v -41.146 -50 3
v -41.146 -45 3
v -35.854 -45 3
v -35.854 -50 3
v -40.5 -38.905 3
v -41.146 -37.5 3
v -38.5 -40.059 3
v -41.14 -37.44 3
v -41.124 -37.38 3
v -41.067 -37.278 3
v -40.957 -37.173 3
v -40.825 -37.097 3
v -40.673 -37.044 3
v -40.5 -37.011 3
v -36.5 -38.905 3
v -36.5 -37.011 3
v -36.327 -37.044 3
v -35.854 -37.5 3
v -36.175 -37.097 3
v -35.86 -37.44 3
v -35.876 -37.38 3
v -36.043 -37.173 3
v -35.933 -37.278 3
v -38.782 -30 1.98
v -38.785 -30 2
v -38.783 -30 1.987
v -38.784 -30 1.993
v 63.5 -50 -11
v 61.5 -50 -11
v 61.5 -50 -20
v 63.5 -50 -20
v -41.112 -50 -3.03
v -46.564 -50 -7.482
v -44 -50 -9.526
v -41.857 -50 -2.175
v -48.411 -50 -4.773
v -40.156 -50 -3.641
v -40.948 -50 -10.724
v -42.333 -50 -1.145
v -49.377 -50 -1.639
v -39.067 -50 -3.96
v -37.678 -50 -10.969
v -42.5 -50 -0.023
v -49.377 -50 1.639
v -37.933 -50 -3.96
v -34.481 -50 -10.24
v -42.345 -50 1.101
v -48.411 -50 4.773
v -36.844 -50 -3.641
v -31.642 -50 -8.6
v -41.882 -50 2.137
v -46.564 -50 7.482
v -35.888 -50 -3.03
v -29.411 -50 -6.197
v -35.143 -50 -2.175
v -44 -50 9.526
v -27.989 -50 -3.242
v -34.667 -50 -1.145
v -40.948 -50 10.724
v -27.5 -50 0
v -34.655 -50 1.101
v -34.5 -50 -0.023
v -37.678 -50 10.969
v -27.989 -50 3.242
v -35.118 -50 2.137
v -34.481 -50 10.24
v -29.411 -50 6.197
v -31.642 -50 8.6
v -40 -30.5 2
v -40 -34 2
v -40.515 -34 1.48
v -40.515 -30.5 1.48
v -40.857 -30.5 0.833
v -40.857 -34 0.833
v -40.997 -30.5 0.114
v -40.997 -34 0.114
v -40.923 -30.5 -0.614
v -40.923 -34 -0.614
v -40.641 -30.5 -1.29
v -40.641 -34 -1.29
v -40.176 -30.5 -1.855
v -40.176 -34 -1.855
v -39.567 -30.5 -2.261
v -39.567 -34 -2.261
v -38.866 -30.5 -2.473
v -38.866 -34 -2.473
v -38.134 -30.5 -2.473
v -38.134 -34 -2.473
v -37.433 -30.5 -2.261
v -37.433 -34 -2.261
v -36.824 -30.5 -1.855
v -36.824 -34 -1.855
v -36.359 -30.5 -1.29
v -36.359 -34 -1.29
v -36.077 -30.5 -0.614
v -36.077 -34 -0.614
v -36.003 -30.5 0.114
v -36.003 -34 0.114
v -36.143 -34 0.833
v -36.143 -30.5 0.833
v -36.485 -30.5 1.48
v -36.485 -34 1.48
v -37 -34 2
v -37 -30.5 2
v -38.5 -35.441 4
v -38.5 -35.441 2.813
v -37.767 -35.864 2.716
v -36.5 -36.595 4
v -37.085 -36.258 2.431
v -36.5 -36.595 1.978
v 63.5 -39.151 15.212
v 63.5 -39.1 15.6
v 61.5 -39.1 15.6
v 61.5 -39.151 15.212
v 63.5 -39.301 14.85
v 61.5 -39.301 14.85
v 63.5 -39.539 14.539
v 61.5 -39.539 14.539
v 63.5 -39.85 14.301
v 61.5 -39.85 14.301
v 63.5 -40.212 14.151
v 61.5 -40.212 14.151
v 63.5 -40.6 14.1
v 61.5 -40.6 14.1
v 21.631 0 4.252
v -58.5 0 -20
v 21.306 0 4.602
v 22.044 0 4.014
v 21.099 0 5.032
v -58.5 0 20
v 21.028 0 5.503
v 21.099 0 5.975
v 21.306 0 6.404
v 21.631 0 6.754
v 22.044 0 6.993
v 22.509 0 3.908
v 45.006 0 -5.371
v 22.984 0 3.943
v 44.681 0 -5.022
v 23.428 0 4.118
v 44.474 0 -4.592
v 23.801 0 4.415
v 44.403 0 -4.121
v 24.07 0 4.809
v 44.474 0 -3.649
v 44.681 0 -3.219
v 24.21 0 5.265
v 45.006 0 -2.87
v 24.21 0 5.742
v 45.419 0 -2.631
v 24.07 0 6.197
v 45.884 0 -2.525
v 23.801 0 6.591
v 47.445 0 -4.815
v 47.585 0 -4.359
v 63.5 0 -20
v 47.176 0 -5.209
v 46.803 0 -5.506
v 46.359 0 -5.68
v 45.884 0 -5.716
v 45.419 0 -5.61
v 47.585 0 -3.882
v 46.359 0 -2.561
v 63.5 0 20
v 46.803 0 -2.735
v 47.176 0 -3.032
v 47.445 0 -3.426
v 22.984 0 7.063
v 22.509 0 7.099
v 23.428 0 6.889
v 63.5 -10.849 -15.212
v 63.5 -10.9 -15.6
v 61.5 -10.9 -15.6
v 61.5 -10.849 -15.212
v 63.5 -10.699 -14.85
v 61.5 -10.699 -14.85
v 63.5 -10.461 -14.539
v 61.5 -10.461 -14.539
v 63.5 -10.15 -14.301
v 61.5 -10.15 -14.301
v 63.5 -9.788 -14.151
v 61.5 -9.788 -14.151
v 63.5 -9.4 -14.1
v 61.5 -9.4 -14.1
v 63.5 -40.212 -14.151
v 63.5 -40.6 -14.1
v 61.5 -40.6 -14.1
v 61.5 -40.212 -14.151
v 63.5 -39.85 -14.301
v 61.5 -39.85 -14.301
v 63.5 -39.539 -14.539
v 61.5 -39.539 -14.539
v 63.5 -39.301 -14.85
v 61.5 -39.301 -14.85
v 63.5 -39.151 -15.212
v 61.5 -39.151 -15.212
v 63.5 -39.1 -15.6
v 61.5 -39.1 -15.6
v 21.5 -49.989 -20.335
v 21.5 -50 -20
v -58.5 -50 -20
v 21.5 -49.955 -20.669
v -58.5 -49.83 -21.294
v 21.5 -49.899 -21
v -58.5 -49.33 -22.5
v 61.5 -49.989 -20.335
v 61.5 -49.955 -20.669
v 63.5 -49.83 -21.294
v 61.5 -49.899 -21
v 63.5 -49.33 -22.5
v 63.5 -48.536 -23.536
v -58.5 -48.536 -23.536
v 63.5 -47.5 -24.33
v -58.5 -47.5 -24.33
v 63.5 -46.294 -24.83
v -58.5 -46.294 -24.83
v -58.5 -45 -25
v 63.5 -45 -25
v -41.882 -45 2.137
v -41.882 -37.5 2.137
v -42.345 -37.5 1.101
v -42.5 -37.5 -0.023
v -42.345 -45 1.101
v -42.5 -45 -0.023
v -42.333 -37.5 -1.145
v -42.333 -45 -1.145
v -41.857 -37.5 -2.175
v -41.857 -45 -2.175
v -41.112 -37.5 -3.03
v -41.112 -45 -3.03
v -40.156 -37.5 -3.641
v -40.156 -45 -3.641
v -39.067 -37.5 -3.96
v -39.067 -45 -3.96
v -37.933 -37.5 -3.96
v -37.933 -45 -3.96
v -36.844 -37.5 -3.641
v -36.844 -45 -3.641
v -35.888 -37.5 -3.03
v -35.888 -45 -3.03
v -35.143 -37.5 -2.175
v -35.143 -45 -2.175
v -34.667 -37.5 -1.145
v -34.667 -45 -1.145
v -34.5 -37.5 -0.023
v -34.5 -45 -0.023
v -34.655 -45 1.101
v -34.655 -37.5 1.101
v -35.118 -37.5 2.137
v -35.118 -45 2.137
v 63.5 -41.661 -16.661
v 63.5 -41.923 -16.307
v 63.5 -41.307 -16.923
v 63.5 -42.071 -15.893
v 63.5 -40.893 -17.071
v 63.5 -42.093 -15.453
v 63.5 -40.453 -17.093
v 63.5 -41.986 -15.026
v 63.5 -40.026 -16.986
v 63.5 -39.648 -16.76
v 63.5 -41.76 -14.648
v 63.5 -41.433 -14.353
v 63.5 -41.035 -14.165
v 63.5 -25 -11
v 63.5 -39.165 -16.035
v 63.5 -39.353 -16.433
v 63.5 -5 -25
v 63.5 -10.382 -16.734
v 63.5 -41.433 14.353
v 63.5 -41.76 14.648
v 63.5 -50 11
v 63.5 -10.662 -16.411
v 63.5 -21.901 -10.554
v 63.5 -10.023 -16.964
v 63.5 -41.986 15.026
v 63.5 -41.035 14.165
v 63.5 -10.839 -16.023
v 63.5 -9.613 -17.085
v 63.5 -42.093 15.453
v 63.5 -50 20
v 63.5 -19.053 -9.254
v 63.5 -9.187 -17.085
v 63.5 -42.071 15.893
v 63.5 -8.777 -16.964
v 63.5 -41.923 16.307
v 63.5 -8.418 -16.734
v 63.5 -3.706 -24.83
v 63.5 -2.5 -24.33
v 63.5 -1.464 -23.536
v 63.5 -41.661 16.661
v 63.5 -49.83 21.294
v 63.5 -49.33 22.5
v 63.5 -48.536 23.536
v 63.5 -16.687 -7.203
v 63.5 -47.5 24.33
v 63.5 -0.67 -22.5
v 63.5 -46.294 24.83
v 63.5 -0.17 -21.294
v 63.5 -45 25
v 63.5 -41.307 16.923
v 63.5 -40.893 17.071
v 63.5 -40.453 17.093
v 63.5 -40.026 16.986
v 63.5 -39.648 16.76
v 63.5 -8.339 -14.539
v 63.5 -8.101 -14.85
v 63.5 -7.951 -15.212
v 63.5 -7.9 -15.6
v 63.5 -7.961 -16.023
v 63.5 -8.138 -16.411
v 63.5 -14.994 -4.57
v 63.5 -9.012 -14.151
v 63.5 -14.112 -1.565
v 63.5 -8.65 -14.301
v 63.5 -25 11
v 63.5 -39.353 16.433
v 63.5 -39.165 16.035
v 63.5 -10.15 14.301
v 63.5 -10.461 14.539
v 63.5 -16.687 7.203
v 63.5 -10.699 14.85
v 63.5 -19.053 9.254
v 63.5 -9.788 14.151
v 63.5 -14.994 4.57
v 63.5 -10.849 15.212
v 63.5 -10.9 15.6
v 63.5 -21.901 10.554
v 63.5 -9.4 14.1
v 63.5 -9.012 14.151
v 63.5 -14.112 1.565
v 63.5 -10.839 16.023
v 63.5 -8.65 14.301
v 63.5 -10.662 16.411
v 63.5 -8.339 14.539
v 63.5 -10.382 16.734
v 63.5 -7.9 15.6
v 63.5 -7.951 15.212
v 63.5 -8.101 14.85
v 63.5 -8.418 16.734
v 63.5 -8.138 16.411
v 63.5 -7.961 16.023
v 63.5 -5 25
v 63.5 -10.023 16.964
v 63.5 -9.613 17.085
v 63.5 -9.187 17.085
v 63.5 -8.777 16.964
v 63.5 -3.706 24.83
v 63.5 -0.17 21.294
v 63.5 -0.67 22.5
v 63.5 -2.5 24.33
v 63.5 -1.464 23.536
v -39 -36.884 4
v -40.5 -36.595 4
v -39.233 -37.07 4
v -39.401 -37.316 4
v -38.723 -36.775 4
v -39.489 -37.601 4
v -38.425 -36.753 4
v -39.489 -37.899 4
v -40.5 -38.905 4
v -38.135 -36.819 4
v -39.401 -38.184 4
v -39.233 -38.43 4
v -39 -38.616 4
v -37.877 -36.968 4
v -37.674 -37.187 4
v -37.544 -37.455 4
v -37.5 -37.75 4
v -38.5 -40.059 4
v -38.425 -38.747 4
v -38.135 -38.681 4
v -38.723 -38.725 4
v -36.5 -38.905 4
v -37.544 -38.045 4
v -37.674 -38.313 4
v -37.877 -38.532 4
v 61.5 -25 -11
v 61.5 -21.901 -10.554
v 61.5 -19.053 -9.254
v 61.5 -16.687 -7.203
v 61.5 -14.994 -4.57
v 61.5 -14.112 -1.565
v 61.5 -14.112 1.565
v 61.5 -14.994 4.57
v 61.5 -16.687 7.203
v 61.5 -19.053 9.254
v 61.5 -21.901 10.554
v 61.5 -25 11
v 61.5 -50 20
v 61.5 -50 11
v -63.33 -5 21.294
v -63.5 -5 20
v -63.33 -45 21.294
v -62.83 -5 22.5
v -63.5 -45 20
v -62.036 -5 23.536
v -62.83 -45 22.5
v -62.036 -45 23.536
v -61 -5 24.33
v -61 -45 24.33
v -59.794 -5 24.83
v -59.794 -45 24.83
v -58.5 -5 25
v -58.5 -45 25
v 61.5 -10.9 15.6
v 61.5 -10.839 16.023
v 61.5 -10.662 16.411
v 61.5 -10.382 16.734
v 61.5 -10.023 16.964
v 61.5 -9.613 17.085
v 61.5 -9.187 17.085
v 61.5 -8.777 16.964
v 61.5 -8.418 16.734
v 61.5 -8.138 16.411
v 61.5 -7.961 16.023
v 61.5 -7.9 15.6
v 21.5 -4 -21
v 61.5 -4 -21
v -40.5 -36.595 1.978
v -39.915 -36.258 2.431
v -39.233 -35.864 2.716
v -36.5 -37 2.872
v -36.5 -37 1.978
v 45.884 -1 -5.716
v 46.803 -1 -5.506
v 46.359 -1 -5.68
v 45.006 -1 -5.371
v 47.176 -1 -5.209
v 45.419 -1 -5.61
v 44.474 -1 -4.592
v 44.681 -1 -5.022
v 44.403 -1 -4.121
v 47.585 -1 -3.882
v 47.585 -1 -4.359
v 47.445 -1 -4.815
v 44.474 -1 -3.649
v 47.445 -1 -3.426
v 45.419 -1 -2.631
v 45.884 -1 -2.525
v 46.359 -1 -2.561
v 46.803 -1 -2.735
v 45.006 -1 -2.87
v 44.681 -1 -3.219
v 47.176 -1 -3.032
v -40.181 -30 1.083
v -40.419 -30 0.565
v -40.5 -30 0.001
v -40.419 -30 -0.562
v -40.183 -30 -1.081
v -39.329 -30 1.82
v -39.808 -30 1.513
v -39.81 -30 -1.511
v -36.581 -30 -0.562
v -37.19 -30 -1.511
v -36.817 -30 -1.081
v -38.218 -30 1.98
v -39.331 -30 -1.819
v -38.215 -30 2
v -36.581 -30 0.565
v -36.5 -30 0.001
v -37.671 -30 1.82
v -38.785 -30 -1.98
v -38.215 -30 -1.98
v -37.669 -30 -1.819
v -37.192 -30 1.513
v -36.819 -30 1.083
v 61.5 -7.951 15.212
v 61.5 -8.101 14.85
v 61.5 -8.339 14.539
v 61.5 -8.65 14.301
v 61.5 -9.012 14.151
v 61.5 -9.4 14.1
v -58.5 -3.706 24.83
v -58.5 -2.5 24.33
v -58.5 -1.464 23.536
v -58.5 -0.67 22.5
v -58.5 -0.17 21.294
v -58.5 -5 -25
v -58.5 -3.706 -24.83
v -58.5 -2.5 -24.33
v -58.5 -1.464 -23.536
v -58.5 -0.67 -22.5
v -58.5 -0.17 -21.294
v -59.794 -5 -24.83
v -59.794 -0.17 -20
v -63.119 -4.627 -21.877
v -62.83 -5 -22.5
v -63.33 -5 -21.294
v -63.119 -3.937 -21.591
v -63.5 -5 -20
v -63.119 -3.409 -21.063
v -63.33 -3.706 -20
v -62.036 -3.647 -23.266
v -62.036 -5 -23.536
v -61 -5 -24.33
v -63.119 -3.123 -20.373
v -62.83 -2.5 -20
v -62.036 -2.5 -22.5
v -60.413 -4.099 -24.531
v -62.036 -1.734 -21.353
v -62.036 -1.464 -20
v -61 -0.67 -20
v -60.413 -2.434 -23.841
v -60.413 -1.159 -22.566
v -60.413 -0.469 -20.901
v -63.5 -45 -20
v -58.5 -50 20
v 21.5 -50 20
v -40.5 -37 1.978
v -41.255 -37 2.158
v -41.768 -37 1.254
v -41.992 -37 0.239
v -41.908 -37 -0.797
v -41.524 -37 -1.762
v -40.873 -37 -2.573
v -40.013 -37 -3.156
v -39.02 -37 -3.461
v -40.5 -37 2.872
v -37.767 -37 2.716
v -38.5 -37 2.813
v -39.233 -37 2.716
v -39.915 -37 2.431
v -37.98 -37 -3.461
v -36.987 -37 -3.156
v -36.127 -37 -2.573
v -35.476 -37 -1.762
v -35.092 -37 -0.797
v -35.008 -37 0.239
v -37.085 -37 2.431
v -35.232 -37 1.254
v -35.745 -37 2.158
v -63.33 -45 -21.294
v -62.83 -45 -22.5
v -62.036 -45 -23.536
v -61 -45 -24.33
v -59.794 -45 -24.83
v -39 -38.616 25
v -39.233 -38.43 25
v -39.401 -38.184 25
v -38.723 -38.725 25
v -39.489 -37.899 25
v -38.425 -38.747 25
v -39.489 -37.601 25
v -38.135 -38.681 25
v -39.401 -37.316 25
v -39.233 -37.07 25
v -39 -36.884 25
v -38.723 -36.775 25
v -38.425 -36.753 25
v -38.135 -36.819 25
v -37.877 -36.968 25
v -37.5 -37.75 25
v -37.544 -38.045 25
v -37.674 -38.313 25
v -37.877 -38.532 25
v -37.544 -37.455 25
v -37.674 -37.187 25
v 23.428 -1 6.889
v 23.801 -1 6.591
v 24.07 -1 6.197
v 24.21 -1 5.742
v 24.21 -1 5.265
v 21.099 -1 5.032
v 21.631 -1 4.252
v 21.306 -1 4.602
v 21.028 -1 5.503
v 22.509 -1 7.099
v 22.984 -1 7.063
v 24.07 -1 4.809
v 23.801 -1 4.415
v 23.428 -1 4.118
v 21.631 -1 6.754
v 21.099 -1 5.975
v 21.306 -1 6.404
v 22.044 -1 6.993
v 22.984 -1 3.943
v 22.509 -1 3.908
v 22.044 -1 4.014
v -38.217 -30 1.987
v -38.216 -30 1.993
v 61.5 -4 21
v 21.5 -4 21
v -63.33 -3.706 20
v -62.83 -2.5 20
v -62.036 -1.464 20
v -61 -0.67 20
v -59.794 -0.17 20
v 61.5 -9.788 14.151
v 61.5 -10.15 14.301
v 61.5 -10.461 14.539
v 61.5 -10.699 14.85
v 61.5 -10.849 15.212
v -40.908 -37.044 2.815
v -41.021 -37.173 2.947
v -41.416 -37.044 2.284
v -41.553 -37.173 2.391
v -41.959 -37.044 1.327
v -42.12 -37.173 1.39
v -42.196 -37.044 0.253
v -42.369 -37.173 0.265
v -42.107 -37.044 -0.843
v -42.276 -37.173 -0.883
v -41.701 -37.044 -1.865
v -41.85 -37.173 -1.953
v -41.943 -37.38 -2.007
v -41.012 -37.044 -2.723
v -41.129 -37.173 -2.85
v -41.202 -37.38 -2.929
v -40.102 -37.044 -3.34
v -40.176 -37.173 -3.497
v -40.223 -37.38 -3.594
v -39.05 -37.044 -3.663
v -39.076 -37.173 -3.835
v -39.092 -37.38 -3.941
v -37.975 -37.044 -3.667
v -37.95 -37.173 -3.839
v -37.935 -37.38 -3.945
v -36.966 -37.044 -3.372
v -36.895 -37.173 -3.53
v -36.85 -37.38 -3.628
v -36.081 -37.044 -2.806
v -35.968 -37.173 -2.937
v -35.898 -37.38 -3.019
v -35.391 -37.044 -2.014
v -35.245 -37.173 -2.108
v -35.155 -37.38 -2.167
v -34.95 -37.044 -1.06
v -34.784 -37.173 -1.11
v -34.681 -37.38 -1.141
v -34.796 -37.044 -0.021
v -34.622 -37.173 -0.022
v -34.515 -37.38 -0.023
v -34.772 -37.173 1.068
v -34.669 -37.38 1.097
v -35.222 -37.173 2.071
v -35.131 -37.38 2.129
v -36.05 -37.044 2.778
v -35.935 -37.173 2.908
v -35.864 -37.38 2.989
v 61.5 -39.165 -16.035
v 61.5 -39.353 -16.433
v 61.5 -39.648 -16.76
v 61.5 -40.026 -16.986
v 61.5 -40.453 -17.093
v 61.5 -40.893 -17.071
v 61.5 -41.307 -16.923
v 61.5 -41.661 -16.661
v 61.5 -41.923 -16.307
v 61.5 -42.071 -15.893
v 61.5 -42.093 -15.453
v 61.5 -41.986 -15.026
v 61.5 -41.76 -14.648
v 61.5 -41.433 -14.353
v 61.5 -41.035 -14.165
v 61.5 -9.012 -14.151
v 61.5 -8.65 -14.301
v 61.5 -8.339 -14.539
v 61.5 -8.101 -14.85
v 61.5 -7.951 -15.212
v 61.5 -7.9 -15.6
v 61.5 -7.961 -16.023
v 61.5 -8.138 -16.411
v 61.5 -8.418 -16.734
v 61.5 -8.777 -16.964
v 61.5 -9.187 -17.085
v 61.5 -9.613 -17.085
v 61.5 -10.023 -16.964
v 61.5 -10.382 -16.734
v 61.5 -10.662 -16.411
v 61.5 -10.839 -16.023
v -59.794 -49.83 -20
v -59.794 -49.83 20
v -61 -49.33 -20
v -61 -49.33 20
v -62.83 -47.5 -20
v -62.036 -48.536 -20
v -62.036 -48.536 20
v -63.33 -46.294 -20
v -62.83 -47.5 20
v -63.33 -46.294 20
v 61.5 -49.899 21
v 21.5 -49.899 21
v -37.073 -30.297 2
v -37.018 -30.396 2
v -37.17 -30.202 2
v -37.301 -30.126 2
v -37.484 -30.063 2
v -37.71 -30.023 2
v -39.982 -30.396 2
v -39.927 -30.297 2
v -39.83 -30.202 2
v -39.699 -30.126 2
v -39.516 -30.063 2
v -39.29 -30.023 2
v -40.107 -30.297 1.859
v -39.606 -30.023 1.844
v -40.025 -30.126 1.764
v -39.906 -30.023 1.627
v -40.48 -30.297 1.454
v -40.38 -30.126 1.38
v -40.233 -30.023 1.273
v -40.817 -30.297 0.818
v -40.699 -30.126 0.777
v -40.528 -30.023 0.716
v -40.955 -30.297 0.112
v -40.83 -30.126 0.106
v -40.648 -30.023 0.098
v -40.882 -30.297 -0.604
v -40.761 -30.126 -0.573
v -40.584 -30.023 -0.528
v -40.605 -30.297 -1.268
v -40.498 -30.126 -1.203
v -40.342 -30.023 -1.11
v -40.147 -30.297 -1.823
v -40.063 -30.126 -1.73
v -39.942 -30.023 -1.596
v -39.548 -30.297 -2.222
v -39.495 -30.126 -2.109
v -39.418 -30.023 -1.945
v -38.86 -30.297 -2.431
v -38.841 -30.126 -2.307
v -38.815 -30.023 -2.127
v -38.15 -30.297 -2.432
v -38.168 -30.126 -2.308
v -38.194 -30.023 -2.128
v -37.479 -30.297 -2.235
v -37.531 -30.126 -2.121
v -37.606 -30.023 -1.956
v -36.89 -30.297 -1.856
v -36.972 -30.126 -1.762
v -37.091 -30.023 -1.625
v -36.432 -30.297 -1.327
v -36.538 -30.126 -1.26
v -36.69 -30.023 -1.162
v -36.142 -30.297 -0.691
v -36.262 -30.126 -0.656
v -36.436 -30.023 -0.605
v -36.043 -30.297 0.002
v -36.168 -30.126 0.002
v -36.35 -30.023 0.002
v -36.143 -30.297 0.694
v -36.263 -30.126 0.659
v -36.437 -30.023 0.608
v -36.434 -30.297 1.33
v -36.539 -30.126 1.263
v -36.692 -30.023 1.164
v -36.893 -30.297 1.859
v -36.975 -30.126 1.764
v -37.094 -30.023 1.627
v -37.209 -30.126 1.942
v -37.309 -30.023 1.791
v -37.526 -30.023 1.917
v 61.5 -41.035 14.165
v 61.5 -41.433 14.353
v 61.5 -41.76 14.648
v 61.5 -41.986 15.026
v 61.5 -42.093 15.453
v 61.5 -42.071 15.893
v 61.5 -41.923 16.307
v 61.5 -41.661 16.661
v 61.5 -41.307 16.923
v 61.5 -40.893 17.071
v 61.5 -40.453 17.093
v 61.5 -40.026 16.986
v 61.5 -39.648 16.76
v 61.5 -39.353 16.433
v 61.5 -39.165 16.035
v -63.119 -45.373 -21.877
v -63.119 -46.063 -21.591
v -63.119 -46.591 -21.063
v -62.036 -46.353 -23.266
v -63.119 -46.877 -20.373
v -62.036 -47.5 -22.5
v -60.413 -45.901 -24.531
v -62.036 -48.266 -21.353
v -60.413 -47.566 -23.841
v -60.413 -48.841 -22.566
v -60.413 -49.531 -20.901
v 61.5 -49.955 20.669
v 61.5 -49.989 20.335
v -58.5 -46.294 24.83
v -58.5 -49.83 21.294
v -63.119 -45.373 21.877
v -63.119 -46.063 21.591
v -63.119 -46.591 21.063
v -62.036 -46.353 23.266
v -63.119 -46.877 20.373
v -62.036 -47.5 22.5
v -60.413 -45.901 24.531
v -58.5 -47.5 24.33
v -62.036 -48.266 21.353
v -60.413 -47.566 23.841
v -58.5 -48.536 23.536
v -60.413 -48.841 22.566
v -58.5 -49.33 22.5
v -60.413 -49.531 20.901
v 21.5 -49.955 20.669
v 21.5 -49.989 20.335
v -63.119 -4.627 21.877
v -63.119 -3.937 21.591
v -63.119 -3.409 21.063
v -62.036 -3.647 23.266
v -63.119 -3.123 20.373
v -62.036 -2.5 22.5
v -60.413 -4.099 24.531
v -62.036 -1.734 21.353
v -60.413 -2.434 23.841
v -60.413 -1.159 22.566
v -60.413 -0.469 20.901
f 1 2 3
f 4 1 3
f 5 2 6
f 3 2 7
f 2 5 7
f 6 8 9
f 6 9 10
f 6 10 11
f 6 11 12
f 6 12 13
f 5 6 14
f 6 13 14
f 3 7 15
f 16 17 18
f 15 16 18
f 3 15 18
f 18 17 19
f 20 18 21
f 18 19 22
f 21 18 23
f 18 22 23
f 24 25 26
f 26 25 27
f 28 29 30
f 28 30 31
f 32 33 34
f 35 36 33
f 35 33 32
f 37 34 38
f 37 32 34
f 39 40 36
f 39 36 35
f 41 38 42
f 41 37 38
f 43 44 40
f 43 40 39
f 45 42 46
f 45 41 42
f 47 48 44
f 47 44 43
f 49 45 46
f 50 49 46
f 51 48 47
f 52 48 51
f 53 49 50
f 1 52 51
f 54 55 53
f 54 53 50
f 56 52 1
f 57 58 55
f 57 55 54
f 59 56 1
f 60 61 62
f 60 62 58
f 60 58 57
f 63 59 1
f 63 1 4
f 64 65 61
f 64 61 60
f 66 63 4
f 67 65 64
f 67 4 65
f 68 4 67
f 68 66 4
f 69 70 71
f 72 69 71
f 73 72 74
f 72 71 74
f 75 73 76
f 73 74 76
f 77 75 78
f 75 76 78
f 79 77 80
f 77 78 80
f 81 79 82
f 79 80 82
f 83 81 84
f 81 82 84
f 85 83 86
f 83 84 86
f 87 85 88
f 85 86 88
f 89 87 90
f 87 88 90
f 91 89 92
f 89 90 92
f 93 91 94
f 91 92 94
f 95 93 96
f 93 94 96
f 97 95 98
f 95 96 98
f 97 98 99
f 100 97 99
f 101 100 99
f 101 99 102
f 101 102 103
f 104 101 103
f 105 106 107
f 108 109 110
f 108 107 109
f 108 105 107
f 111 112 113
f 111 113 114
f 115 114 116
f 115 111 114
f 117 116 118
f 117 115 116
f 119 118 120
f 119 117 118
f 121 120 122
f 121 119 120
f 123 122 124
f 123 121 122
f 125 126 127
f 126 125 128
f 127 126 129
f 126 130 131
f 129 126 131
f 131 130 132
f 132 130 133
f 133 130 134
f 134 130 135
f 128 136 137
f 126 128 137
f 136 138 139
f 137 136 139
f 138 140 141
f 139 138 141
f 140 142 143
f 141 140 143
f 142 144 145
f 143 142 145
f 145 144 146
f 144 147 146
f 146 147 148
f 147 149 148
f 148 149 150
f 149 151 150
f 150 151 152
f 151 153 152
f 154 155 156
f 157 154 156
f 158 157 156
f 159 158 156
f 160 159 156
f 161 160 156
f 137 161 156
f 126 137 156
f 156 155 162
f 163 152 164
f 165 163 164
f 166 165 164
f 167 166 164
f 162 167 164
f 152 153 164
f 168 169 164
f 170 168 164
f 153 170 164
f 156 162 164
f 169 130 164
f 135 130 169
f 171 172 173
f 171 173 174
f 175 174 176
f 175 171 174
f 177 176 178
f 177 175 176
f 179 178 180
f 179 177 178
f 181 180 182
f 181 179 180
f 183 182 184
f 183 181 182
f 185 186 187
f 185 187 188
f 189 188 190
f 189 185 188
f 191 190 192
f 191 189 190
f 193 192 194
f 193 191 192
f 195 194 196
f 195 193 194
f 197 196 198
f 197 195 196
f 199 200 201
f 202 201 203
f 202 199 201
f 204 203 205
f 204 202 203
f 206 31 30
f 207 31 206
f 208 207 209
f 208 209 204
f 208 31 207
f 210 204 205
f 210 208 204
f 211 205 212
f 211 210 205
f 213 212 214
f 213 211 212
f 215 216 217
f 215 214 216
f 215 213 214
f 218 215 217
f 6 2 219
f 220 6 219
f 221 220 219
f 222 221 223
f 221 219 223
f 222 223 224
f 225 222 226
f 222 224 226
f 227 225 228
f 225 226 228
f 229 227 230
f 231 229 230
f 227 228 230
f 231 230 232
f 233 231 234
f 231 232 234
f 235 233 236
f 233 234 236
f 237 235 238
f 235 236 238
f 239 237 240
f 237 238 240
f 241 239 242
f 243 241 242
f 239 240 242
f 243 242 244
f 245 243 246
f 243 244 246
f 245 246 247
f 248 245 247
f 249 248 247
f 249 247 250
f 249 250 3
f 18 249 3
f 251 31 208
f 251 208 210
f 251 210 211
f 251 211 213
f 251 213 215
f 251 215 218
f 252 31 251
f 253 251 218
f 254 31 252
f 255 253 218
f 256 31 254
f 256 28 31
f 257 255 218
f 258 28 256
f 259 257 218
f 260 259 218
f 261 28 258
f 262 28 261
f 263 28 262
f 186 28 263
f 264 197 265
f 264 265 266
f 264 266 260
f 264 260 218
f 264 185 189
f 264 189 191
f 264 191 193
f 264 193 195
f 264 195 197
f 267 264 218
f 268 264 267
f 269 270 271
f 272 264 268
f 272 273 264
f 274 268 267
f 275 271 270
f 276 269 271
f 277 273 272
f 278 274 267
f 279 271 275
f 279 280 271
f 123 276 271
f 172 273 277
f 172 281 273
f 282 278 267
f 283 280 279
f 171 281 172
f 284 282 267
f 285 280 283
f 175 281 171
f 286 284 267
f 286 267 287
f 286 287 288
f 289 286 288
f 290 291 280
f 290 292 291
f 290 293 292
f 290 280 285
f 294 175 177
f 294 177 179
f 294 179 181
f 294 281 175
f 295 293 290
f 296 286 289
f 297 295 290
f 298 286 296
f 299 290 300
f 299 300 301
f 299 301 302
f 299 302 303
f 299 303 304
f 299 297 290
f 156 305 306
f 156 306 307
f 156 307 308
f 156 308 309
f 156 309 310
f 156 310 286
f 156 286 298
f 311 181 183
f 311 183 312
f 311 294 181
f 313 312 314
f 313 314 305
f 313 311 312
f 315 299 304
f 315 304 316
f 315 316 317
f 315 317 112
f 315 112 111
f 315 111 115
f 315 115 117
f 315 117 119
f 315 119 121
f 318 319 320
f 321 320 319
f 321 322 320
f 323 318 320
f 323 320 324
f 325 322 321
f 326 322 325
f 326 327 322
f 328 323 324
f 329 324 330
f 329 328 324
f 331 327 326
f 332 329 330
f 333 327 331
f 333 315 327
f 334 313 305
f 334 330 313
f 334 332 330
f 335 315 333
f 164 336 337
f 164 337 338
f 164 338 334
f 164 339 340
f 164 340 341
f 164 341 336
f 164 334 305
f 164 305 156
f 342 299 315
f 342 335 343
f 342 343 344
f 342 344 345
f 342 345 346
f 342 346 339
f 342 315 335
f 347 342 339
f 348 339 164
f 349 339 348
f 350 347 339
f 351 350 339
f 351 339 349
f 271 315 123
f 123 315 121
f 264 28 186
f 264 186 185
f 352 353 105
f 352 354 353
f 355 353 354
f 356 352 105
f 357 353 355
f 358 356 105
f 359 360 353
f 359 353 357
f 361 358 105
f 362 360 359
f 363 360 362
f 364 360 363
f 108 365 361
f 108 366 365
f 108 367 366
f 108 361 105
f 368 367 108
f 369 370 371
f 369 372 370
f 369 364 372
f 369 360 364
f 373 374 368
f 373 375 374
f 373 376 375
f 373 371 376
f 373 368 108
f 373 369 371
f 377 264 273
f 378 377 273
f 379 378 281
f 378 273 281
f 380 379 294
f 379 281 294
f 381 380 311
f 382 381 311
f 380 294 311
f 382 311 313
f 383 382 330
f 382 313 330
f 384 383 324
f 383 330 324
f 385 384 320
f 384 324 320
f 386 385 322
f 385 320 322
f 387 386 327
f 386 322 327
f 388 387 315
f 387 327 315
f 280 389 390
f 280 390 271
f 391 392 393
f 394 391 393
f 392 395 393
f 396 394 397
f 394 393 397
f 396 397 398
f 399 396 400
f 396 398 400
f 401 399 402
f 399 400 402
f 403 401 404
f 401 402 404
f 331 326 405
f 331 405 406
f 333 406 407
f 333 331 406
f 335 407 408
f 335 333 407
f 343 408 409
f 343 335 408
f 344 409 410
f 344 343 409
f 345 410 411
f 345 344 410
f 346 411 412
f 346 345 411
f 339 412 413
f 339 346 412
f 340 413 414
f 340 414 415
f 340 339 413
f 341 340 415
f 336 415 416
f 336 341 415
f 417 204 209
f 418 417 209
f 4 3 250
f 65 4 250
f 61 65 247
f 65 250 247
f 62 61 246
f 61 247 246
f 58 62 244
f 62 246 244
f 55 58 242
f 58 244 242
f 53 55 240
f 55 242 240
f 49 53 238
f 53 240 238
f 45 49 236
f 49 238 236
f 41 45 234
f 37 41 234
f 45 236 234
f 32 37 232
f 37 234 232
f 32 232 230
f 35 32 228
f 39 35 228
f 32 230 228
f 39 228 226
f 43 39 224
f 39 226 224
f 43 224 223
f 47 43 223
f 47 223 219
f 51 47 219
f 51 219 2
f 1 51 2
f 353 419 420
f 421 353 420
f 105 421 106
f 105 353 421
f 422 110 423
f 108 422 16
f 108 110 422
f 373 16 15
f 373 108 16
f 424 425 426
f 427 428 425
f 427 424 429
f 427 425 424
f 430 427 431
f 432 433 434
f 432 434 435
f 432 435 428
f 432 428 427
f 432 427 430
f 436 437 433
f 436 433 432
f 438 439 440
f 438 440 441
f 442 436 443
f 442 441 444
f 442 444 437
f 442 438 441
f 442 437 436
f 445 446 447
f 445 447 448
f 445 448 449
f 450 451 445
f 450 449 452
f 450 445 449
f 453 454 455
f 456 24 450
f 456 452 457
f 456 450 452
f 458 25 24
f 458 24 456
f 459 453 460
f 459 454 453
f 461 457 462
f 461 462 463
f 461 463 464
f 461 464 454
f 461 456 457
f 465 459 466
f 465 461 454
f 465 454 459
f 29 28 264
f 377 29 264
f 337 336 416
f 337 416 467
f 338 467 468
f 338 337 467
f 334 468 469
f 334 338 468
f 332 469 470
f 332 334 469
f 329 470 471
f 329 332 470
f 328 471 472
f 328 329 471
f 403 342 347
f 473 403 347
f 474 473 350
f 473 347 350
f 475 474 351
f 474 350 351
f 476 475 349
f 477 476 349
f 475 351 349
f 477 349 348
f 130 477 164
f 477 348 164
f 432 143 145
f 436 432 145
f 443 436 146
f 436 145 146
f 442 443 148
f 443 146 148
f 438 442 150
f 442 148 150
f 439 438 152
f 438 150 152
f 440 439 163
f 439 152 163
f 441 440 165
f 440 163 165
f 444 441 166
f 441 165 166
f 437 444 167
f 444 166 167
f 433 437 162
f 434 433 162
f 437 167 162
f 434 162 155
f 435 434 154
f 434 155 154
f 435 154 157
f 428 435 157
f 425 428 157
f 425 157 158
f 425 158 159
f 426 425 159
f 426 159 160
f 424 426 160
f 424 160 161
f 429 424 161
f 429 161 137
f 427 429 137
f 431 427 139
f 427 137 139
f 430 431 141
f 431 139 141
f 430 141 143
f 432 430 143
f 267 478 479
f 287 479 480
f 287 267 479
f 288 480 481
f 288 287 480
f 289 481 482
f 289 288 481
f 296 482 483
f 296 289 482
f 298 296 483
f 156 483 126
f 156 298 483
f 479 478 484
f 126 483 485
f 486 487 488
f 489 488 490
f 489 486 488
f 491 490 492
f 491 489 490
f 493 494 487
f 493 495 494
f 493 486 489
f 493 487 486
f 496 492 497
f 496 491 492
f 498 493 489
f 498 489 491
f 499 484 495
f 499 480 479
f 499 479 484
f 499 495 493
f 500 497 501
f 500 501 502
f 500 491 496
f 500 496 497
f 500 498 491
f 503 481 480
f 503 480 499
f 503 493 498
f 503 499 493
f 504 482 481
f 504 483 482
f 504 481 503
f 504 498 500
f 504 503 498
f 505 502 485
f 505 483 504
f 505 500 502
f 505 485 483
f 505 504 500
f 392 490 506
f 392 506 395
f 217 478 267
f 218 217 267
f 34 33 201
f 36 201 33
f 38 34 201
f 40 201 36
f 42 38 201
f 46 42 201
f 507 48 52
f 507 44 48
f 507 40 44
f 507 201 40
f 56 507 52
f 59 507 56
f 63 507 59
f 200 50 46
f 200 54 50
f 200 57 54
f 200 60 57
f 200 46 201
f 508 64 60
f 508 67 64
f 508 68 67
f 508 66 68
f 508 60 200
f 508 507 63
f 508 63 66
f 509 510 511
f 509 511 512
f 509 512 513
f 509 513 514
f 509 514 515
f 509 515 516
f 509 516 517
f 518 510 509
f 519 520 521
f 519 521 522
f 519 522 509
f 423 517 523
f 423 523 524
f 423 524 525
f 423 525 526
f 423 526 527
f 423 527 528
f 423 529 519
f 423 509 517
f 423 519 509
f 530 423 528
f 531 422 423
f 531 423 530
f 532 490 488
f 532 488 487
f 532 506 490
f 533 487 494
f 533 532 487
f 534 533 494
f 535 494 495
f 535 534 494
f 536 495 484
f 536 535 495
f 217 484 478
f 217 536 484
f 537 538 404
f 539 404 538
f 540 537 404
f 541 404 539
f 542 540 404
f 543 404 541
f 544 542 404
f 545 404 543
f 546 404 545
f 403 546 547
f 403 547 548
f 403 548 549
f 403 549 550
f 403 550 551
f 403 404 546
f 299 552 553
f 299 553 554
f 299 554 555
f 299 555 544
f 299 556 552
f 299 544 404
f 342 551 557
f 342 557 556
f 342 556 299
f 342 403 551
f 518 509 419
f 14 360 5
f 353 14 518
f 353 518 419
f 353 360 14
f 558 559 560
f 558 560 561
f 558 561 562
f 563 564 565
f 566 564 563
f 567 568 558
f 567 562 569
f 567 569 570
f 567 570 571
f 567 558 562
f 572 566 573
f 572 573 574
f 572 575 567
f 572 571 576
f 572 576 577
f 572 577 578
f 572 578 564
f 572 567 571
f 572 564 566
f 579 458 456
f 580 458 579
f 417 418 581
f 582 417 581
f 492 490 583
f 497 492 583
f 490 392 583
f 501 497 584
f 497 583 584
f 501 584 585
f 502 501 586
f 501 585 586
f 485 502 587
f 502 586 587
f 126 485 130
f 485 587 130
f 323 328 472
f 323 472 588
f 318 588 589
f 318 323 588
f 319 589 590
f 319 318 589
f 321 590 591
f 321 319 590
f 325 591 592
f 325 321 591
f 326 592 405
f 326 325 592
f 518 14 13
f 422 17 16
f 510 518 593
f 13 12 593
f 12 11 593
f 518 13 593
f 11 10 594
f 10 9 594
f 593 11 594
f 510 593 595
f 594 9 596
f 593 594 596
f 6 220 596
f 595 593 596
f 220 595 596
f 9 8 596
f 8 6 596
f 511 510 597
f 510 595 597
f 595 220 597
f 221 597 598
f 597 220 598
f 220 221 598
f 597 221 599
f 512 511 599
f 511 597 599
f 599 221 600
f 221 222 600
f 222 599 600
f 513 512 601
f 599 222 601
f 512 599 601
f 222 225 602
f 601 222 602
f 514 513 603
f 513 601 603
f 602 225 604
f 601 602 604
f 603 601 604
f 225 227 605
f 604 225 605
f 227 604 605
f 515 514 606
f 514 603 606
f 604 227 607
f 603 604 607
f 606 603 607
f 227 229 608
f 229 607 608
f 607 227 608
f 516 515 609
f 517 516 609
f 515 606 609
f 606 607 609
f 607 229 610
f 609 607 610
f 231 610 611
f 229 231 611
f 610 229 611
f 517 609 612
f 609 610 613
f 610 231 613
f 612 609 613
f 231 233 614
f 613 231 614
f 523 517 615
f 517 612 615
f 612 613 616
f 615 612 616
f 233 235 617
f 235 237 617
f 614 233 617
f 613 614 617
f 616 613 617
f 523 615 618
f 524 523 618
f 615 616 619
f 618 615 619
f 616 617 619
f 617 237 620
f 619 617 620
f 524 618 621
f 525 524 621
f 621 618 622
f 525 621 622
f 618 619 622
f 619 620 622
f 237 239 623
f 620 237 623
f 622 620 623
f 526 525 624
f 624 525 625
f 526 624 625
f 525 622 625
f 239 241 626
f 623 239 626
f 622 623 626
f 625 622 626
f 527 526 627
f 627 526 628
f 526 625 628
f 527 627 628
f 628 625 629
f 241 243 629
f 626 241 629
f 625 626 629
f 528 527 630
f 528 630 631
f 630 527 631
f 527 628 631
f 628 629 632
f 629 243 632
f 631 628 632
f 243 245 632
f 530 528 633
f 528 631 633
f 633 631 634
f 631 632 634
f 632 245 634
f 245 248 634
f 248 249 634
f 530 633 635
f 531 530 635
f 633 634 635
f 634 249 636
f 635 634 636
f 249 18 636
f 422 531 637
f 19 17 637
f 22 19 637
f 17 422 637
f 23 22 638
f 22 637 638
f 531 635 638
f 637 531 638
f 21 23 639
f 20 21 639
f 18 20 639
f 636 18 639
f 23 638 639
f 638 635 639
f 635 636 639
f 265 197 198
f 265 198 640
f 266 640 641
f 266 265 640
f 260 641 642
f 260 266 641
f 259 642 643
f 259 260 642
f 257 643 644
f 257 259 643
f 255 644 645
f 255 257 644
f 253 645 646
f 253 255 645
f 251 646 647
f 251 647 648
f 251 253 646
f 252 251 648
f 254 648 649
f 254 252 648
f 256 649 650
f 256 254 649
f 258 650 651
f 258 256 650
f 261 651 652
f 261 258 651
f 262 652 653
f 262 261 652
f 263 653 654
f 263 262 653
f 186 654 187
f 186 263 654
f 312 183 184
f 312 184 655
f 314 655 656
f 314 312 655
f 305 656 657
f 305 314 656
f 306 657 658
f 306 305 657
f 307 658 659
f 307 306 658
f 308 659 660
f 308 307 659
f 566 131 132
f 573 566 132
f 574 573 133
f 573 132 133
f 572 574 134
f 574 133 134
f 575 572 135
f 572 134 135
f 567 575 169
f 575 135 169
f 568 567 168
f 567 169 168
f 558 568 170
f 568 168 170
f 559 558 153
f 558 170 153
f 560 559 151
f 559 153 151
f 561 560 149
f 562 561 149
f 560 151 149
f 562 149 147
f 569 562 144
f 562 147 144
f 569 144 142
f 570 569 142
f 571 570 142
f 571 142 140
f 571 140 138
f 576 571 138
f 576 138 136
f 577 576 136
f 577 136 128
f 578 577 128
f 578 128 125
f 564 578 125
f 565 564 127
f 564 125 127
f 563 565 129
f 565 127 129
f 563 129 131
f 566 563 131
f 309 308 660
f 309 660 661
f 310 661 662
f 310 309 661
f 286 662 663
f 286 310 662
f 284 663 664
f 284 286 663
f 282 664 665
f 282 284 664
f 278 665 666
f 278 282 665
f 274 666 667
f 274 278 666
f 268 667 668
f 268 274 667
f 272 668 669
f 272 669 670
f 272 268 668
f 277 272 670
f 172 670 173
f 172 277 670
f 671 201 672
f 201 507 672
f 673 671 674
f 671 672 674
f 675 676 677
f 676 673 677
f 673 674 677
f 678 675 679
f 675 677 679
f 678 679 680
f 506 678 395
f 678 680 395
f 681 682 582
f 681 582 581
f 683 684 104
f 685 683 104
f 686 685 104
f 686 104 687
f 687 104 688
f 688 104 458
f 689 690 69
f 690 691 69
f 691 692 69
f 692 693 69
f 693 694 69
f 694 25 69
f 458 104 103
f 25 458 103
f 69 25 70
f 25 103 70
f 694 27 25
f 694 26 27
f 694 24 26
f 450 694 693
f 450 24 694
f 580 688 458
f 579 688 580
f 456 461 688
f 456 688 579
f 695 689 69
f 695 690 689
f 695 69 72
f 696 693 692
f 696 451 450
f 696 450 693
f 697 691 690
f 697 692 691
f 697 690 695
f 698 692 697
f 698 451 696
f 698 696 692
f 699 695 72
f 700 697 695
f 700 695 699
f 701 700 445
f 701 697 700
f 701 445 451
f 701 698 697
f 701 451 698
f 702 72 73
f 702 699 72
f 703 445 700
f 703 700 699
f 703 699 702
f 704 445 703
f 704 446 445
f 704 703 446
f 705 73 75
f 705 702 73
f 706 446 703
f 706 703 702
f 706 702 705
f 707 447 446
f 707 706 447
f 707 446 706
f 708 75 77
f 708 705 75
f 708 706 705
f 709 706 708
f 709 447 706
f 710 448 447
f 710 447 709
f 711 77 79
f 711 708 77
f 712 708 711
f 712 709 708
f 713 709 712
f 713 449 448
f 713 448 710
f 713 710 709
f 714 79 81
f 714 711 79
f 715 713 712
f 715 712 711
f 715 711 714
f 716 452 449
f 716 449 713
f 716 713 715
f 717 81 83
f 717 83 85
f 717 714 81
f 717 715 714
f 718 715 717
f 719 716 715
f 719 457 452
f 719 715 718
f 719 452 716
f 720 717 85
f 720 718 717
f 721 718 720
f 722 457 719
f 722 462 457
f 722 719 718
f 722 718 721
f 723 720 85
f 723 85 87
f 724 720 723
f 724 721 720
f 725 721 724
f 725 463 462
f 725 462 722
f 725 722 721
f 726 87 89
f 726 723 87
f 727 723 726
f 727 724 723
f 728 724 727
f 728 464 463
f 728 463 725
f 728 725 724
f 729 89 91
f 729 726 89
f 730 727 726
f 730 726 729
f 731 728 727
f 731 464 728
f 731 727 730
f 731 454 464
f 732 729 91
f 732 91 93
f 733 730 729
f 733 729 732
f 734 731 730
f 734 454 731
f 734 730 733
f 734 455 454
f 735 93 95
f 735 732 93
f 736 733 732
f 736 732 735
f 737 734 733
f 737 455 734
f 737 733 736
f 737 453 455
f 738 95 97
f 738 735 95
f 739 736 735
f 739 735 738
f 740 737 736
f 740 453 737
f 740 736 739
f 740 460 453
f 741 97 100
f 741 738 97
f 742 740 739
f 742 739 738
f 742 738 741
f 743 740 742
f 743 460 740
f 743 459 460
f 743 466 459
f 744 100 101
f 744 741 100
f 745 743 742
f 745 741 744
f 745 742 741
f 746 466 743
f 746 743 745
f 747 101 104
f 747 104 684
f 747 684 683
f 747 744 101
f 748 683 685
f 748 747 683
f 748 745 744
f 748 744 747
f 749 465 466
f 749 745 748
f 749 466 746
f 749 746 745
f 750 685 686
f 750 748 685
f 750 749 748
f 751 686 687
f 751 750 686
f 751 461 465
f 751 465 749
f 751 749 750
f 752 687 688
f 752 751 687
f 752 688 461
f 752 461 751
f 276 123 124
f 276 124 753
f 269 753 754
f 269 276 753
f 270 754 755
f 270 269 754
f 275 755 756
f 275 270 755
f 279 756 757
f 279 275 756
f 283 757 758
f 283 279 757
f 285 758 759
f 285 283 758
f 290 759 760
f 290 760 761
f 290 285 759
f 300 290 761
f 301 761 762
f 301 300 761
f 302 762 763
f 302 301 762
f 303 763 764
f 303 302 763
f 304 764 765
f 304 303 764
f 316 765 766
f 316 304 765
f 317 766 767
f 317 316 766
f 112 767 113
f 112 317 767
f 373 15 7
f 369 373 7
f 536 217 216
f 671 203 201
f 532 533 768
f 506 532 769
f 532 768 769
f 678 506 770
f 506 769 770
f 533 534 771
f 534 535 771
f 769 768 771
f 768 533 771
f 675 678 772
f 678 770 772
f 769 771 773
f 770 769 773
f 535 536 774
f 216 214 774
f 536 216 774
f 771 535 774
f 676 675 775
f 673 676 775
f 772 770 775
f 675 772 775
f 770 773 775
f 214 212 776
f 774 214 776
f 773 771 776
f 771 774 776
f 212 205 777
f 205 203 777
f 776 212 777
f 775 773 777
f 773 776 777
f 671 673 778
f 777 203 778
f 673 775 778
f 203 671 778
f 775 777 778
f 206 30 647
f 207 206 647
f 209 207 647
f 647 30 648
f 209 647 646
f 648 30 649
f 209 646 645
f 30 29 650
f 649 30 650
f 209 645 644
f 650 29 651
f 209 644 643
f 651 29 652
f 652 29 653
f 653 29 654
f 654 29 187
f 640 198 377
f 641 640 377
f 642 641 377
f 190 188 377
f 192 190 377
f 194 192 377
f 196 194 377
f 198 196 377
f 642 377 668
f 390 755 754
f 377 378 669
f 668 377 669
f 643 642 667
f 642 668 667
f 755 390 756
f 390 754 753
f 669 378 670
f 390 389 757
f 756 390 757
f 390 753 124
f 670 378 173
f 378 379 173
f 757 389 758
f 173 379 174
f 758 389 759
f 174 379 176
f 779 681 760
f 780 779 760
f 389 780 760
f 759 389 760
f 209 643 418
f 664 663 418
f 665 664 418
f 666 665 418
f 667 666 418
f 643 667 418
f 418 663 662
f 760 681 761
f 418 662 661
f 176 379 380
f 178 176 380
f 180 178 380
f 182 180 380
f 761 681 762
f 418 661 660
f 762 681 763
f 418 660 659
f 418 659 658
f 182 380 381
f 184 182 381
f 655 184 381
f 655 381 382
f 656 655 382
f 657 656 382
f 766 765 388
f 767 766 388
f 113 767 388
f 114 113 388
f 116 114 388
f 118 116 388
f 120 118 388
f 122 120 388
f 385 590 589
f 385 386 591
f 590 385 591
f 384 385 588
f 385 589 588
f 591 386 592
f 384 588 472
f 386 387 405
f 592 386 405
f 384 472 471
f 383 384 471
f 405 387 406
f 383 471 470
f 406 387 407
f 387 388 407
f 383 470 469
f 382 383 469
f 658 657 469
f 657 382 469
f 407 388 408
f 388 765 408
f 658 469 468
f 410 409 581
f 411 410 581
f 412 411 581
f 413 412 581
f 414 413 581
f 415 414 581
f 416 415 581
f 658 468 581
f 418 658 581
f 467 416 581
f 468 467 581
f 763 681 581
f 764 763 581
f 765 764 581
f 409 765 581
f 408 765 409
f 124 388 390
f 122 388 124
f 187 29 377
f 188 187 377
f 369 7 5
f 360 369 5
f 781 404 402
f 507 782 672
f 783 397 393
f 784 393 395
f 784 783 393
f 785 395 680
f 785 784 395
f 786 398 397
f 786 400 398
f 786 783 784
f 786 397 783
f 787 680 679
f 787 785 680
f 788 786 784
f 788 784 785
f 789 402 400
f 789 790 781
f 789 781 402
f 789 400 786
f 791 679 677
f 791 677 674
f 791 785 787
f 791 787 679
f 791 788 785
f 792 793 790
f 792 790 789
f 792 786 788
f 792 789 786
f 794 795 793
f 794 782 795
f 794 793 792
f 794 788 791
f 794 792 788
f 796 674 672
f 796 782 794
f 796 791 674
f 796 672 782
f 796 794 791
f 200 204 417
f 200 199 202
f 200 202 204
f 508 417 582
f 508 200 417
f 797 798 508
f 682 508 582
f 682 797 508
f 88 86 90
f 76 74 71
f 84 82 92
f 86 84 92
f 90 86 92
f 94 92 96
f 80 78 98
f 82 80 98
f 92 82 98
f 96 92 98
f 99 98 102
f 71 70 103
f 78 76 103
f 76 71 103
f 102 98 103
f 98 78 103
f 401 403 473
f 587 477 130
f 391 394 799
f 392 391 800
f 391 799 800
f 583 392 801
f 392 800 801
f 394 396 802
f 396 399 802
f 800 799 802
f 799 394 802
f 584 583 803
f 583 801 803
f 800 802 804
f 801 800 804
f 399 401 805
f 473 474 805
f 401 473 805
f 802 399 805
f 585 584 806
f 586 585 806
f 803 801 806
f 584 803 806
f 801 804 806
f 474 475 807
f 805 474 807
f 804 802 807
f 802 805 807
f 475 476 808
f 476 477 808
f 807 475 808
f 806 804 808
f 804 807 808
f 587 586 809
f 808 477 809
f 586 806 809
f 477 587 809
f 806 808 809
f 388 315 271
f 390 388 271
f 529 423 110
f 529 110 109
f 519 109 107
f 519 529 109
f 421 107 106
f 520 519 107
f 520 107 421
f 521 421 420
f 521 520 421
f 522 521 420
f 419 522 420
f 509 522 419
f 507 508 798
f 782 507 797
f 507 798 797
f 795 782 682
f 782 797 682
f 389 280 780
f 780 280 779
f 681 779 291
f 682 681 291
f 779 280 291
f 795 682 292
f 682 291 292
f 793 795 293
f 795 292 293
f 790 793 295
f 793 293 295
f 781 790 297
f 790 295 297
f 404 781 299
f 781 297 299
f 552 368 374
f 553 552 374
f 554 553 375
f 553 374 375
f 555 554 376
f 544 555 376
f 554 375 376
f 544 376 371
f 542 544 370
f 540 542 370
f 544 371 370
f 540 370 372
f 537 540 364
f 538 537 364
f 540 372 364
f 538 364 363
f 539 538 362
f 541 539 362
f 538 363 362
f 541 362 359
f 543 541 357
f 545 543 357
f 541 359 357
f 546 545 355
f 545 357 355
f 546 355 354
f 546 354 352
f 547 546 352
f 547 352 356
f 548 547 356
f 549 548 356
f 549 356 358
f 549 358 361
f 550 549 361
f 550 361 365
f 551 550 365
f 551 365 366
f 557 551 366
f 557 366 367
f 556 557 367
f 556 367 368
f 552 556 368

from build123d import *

# Parameters (mm, degrees)
F0_W           = 127
F0_H           = 50
F1_DEPTH       = 50
F3_DEPTH       = 42
F4_R           = 11
F5_DEPTH       = 5
F7_DEPTH       = 15
F8_T2_ANGLE    = 343.7894292622
F9_R           = 5
F12_W          = 40
F12_H          = 42
F13_DEPTH      = 46
F14_R          = 1.6
F15_DEPTH      = 1
F16_R          = 1
F17_DEPTH      = 2
F17_DEPTH_BACK = 1.03
F18_DEPTH      = 25
F19_DEPTH      = 2
F20_DEPTH      = 25
F22_DEPTH      = 8
F23_R          = 2.8130076525
F24_DEPTH      = 3
F25_R          = 0.5
F26_R          = 11
F27_DEPTH      = 5


# Not quite as in the source:
# - a fillet or chamfer that OpenCascade refuses, or shapes differently, is made with other operations: its cross-section is extruded or revolved along the edge and cut away or added


with BuildPart() as f1:
    # F0 (on Front) → F1 (new body)
    with BuildSketch(Plane.XZ):
        Rectangle(F0_W, F0_H)
    extrude(amount=F1_DEPTH)

    # F2 (on face) → F3 (cut)
    with BuildSketch(Plane.YZ.offset(63.5)):
        Polygon((-41.7573593129, 21), (-46, 16.7573593129), (-46, -16.7573593129), (-41.7573593129, -21), (-8.2426406871, -21), (-4, -16.7573593129), (-4, 16.7573593129), (-8.2426406871, 21), align=None)
    extrude(amount=-F3_DEPTH, mode=Mode.SUBTRACT)

    # F4 (on face) → F5 (cut)
    with BuildSketch(Plane.XZ.offset(50)):
        with Locations((-38.5, 0)):
            Circle(F4_R)
    extrude(amount=-F5_DEPTH, mode=Mode.SUBTRACT)

    # F6 (on face) → F7 (cut)
    with BuildSketch(Plane.XZ.offset(45)):
        with BuildLine():
            Line((-37, 2), (-40, 2))
            ThreePointArc((-40, 2), (-38.5, -2.5), (-37, 2))
        make_face()
    extrude(amount=-F7_DEPTH, mode=Mode.SUBTRACT)

    # F8: fillet of radius 0.5 on 1 edges, made by hand

    # F8_s1 → F8_t2 (revolve)
    with BuildSketch(Plane(origin=(-37.7346622942, 0, -5.3739891953), x_dir=(0, 1, 0), z_dir=(0.9900106558, 0, 0.1409925581))):
        with BuildLine():
            ThreePointArc((-30.5, 7.9282134883), (-30.1464466094, 7.7817668789), (-30, 7.4282134883))
            Line((-30, 7.4282134883), (-30, 7.9282134883))
            Line((-30, 7.9282134883), (-30.5, 7.9282134883))
        make_face()
    revolve(axis=Axis((-38.5, -30, 0), (0, -1, 0)), revolution_arc=F8_T2_ANGLE)

    # F9
    f9_edges = [f1.edges().sort_by_distance(p)[0] for p in [
        (0, -50, 25),
        (0, -50, -25),
        (0, 0, 25),
        (0, 0, -25),
        (-63.5, -25, 25),
        (-63.5, -25, -25),
        (-63.5, 0, 0),
        (-63.5, -50, 0),
    ]]
    fillet(f9_edges, radius=F9_R)

    # F12 (on face) → F13 (cut)
    with BuildSketch(Plane.XZ.offset(50)):
        with Locations((41.5, 0)):
            Rectangle(F12_W, F12_H)
    extrude(amount=-F13_DEPTH, mode=Mode.SUBTRACT)

    # F14 (on face) → F15 (cut)
    with BuildSketch(Plane(origin=(0, 0, 0), x_dir=(-1, 0, 0), z_dir=(0, 1, 0))):
        with Locations((-46.0031795697, -4.1205275279)):
            Circle(F14_R)
        with Locations((-22.6282365388, 5.5031795697)):
            Circle(F14_R)
    extrude(amount=-F15_DEPTH, mode=Mode.SUBTRACT)

    # F16 (on face) → F17 (cut, two sides)
    with BuildSketch(Plane(origin=(0, 0, 2), x_dir=(1, 0, 0), z_dir=(0, 0, -1))) as f17_sk:
        Polygon((-36.5, 38.9047005384), (-38.5, 40.0594010768), (-40.5, 38.9047005384), (-40.5, 36.5952994616), (-38.5, 35.4405989232), (-36.5, 36.5952994616), align=None)
        with Locations((-38.5, 37.75)):
            Circle(F16_R, mode=Mode.SUBTRACT)
    extrude(amount=-F17_DEPTH, mode=Mode.SUBTRACT)
    extrude(f17_sk.sketch, amount=F17_DEPTH_BACK, mode=Mode.SUBTRACT)

    # F18 (cut): a face of the model
    f18_faces = [f1.faces().sort_by_distance(p)[0] for p in [
        (-38.5, -37.75, 2),
    ]]
    extrude(f18_faces, amount=-F18_DEPTH, mode=Mode.SUBTRACT)

    # F10 (on face) → F19 (join)
    with BuildSketch(Plane.YZ.offset(63.5)):
        Polygon((-46, 16.7573593129), (-46, -16.7573593129), (-41.7573593129, -21), (-8.2426406871, -21), (-4, -16.7573593129), (-4, 16.7573593129), (-8.2426406871, 21), (-16.9, 21), (-33.1, 21), (-41.7573593129, 21), align=None)
        with BuildLine():
            Line((-10.9, -15.6), (-39.1, -15.6))
            ThreePointArc((-39.1, -15.6), (-41.6606601718, -16.6606601718), (-40.6, -14.1))
            Line((-40.6, -14.1), (-40.6, 14.1))
            ThreePointArc((-40.6, 14.1), (-41.6606601718, 16.6606601718), (-39.1, 15.6))
            Line((-39.1, 15.6), (-10.9, 15.6))
            ThreePointArc((-10.9, 15.6), (-9.4, 17.1), (-7.9, 15.6))
            ThreePointArc((-7.9, 15.6), (-8.3393398282, 14.5393398282), (-9.4, 14.1))
            Line((-9.4, 14.1), (-9.4, -14.1))
            ThreePointArc((-9.4, -14.1), (-8.3393398282, -14.5393398282), (-7.9, -15.6))
            ThreePointArc((-7.9, -15.6), (-9.4, -17.1), (-10.9, -15.6))
        make_face(mode=Mode.SUBTRACT)
        with BuildLine():
            ThreePointArc((-40.6, -14.1), (-39.5393398282, -14.5393398282), (-39.1, -15.6))
            Line((-39.1, -15.6), (-10.9, -15.6))
            ThreePointArc((-10.9, -15.6), (-10.4606601718, -14.5393398282), (-9.4, -14.1))
            Line((-9.4, -14.1), (-9.4, 14.1))
            ThreePointArc((-9.4, 14.1), (-10.4606601718, 14.5393398282), (-10.9, 15.6))
            Line((-10.9, 15.6), (-39.1, 15.6))
            ThreePointArc((-39.1, 15.6), (-39.5393398282, 14.5393398282), (-40.6, 14.1))
            Line((-40.6, 14.1), (-40.6, -14.1))
        make_face()
    extrude(amount=-F19_DEPTH)

    # F11 (on face) → F20 (cut)
    with BuildSketch(Plane.YZ.offset(63.5)):
        with BuildLine():
            Line((-50, -11), (-25, -11))
            ThreePointArc((-25, -11), (-14, 0), (-25, 11))
            Line((-25, 11), (-50, 11))
            Line((-50, 11), (-50, -11))
        make_face()
    extrude(amount=-F20_DEPTH, mode=Mode.SUBTRACT)

    # F21 (on face) → F22 (cut)
    with BuildSketch(Plane.XZ.offset(45)):
        with BuildLine():
            Line((-35.85425, 3.0000011562), (-41.14575, 3.0000011562))
            ThreePointArc((-41.14575, 3.0000011562), (-38.5, -4), (-35.85425, 3.0000011562))
        make_face()
    extrude(amount=-F22_DEPTH, mode=Mode.SUBTRACT)

    # F23 (on face) → F24 (join)
    with BuildSketch(Plane.XZ.offset(37)):
        with Locations((-38.5, 0)):
            Circle(F23_R)
    extrude(amount=-F24_DEPTH)

    # F25
    f25_edges = [f1.edges().sort_by_distance(p)[0] for p in [
        (-38.5, -37, -4),
    ]]
    fillet(f25_edges, radius=F25_R)

    # F26 (on face) → F27 (join, through all)
    with BuildSketch(Plane.XZ.offset(45)):
        with Locations((-38.5, 0)):
            Circle(F26_R)
        with BuildLine():
            ThreePointArc((-35.85425, 3.0000011562), (-38.5, -4), (-41.14575, 3.0000011562))
            Line((-41.14575, 3.0000011562), (-35.85425, 3.0000011562))
        make_face(mode=Mode.SUBTRACT)
    extrude(amount=F27_DEPTH)


solid = f1.part
